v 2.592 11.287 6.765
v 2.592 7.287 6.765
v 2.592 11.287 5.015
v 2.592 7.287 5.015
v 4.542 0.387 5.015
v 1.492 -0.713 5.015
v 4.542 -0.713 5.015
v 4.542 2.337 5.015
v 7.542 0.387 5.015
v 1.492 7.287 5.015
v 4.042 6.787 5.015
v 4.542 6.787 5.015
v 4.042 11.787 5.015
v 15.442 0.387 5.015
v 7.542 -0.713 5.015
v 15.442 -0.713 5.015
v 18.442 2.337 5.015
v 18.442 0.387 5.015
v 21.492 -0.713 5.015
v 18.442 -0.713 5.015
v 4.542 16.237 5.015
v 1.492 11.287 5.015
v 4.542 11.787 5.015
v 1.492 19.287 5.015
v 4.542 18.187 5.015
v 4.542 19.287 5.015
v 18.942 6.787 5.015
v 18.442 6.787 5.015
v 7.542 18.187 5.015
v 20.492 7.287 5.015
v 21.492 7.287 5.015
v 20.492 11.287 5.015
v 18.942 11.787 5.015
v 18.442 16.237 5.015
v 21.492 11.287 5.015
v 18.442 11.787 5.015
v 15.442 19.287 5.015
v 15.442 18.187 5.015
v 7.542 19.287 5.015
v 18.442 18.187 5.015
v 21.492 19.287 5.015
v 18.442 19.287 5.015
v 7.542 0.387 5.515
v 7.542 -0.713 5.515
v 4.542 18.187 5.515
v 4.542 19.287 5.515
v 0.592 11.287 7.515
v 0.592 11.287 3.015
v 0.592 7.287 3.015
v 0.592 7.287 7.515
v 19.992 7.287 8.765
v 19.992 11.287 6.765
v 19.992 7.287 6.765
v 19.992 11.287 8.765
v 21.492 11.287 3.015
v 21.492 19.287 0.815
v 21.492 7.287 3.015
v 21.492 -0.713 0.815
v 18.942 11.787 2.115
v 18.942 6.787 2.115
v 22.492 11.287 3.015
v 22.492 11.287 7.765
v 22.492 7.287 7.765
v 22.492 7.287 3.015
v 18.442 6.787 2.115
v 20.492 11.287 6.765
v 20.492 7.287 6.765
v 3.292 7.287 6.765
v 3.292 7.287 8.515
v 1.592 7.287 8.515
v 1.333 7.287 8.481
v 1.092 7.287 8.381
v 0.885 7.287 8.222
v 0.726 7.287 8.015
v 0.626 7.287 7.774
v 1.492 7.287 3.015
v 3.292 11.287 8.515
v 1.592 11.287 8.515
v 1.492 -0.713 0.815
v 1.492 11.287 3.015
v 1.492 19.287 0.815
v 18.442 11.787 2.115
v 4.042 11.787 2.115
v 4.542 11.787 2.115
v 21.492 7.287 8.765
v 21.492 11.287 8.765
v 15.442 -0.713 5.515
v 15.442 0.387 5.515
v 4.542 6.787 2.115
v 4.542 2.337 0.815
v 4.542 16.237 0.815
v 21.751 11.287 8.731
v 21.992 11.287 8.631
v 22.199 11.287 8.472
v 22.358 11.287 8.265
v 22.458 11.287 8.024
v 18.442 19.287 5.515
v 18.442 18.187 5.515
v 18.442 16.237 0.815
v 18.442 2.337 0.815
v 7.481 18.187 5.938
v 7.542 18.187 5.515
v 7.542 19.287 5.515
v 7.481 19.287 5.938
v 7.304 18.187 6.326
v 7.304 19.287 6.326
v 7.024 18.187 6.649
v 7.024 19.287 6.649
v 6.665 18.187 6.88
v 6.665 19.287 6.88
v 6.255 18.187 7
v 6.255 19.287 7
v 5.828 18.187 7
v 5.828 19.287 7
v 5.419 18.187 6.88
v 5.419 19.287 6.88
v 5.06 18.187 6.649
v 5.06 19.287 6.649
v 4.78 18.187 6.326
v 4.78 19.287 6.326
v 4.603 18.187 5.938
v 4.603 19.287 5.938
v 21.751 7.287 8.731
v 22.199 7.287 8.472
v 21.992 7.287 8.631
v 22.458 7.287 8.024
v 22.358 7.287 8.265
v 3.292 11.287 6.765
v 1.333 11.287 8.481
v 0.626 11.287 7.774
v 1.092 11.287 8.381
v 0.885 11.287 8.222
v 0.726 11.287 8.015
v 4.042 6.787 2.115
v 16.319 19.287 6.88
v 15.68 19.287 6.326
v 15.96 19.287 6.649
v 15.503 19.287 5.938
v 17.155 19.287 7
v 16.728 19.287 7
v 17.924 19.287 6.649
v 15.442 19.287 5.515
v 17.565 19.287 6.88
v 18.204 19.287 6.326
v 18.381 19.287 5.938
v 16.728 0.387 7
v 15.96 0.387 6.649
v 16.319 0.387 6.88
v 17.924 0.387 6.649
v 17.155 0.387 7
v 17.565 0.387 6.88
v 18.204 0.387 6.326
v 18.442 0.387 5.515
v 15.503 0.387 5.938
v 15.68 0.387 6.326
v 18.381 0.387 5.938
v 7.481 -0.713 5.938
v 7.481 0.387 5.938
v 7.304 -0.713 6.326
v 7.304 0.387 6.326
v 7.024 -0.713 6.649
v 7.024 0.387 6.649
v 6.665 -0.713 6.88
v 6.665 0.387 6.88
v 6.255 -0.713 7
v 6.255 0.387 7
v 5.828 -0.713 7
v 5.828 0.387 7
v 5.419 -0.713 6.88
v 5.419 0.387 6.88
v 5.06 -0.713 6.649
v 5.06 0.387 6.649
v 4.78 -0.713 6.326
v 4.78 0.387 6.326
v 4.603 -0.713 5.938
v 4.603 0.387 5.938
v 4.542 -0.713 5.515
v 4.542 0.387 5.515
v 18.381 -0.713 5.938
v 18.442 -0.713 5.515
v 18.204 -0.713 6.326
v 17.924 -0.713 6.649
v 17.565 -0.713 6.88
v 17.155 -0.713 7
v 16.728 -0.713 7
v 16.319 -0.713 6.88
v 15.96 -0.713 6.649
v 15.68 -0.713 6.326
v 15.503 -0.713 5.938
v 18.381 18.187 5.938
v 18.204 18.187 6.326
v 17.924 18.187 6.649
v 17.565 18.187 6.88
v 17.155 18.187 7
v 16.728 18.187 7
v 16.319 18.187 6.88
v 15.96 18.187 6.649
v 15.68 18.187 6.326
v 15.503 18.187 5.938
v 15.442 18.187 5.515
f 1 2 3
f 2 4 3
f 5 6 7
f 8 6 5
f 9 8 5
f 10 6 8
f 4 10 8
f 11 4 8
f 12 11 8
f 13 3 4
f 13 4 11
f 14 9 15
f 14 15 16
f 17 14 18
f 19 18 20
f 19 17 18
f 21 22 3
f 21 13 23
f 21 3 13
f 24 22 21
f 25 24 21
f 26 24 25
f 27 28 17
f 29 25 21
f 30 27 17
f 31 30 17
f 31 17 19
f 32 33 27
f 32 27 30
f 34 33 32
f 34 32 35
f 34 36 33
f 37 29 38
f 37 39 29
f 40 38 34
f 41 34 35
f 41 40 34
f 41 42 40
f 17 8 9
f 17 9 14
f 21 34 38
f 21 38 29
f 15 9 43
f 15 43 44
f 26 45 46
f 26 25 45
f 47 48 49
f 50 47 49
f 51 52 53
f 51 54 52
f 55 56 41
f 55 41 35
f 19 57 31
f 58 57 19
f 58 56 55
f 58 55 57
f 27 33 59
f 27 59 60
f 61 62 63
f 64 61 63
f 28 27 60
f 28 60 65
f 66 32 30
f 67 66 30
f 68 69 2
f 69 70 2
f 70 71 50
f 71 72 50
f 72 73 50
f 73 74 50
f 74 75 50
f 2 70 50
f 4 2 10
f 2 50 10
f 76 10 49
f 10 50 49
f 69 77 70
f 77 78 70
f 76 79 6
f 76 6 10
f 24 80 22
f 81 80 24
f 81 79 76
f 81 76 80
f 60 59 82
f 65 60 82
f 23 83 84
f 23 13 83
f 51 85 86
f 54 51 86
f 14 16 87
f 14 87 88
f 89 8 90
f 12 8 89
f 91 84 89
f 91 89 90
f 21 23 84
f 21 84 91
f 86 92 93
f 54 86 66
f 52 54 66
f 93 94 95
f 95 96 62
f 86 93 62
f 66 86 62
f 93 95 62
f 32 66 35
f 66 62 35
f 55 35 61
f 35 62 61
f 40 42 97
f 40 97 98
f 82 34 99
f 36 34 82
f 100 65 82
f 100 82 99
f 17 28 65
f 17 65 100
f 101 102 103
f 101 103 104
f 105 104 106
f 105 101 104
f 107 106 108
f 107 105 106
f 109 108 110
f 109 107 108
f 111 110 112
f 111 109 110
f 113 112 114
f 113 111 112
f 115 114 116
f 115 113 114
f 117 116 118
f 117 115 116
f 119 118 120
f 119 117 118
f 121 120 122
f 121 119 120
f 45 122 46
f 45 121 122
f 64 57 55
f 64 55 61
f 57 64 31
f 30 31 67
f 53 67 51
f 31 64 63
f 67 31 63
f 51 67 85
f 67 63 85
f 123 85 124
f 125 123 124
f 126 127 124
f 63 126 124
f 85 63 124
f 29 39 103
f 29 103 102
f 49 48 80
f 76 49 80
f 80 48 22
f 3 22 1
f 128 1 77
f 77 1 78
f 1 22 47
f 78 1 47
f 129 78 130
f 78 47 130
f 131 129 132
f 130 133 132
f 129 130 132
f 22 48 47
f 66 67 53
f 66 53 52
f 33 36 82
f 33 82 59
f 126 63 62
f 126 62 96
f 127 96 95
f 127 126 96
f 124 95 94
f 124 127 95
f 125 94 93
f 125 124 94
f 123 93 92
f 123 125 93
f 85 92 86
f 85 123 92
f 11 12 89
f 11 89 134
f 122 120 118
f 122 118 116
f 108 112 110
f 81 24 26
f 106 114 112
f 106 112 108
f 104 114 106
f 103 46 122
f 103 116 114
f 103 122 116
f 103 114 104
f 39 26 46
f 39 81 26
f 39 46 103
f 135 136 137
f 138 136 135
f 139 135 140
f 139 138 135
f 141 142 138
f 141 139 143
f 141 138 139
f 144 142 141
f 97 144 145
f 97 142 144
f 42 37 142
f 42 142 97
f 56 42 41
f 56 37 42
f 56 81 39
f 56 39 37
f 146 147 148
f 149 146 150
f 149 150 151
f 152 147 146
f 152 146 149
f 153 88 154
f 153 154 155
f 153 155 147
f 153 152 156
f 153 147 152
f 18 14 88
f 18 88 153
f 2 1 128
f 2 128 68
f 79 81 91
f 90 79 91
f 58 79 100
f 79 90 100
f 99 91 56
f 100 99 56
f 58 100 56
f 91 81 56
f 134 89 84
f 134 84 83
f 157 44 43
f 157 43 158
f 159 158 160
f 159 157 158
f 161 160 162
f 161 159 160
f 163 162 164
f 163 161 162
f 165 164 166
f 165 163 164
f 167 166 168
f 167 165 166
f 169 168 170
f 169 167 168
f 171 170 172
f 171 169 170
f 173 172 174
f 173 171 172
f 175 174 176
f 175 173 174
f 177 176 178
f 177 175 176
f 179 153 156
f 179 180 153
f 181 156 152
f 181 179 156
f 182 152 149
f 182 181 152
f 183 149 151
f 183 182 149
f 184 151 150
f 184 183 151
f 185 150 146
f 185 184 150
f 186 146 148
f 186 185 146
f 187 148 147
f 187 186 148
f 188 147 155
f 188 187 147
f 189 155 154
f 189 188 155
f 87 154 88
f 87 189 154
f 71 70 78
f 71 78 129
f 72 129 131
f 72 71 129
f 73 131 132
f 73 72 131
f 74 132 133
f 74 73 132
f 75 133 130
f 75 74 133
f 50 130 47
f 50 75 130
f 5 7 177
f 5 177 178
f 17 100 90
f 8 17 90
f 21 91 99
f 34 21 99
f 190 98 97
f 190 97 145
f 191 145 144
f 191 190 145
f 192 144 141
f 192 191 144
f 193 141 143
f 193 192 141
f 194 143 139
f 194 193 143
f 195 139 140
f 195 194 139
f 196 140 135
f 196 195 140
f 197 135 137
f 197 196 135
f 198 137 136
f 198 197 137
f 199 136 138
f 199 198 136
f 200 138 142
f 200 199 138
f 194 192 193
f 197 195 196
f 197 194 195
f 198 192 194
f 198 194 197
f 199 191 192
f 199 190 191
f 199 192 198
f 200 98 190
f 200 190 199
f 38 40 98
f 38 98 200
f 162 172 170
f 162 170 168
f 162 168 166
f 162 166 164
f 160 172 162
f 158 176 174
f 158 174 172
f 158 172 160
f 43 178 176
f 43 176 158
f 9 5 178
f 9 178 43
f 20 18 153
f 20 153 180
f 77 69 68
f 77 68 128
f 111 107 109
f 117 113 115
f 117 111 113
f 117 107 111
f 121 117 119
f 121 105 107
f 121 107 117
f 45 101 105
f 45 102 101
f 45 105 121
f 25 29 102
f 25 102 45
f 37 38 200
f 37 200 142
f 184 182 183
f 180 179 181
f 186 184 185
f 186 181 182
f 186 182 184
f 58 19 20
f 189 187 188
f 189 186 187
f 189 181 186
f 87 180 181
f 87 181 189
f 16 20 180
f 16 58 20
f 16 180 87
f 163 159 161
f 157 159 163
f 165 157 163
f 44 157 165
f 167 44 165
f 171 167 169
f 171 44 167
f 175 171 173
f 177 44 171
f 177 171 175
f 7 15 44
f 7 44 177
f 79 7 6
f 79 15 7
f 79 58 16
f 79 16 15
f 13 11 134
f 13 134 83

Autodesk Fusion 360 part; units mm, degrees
sketch "Sketch1" plane through (0, 0, 0) normal (0, 0, 1) x (1, 0, 0) in component "main-switchbody"
  line L0 (0, 0) -> (0, 20) construction
  line L1 (0, 20) -> (20, 20) construction
  line L2 (20, 20) -> (20, 0) construction
  line L3 (20, 0) -> (0, 0) construction
  line L4 (0, 0) -> (20, 20) construction
  line L5 (20, 0) -> (0, 20) construction
  line L6 (10, 0) -> (18.9, 0) construction
  line L7 (10, 10) -> (18.9, 10) construction
  line L8 (18.9, 10) -> (18.9, 18.9) construction
  line L9 (18.9, 18.9) -> (1.1, 18.9) construction
  line L10 (1.1, 18.9) -> (1.1, 1.1) construction
  line L11 (1.1, 1.1) -> (18.9, 1.1) construction
  line L12 (18.9, 1.1) -> (18.9, 18.9) construction
  line L13 (10, 10) -> (3.05, 10) construction
  line L14 (3.05, 10) -> (3.05, 16.95) construction
  line L15 (3.05, 16.95) -> (16.95, 16.95) construction
  line L16 (16.95, 16.95) -> (16.95, 3.05) construction
  line L17 (16.95, 3.05) -> (3.05, 3.05) construction
  line L18 (3.05, 3.05) -> (3.05, 16.95) construction
  line L19 (3.05, 3.05) -> (0, 3.05) construction
  line L20 (3.05, 3.05) -> (3.05, 0) construction
  line L21 (16.95, 3.05) -> (20, 3.05) construction
  line L22 (16.95, 16.95) -> (20, 16.95) construction
  line L23 (16.95, 16.95) -> (16.95, 20) construction
  line L24 (3.05, 16.95) -> (3.05, 20) construction
  line L25 (3.05, 16.95) -> (0, 16.95) construction
  line L26 (3.05, 18.9) -> (6.05, 18.9) construction
  line L27 (6.05, 18.9) -> (6.05, 20) construction
  line L28 (16.95, 18.9) -> (13.95, 18.9) construction
  line L29 (13.95, 18.9) -> (13.95, 20) construction
  line L30 (16.95, 3.05) -> (16.95, 0) construction
  line L31 (16.95, 1.1) -> (13.95, 1.1) construction
  line L32 (13.95, 1.1) -> (13.95, 0) construction
  line L33 (3.05, 1.1) -> (6.05, 1.1) construction
  line L34 (6.05, 1.1) -> (6.05, 0) construction
  line L35 (0, 20) -> (20, 20) construction
  line L36 (20, 20) -> (20, 0) construction
  line L37 (20, 0) -> (0, 0) construction
  line L38 (0, 0) -> (0, 20) construction
  line L39 (0, 20) -> (20, 20)
  line L40 (20, 20) -> (20, 0)
  line L41 (20, 0) -> (0, 0)
  line L42 (0, 0) -> (0, 20)
  line L43 (16.95, 3.05) -> (3.05, 3.05)
  line L44 (3.05, 3.05) -> (3.05, 16.95)
  line L45 (3.05, 16.95) -> (16.95, 16.95)
  line L46 (16.95, 16.95) -> (16.95, 3.05)
  line L47 (3.05, 1.1) -> (6.05, 1.1)
  line L48 (6.05, 1.1) -> (6.05, 0)
  line L49 (6.05, 0) -> (3.05, 0)
  line L50 (3.05, 0) -> (3.05, 1.1)
  line L51 (13.95, 1.1) -> (16.95, 1.1)
  line L52 (16.95, 1.1) -> (16.95, 0)
  line L53 (16.95, 0) -> (13.95, 0)
  line L54 (13.95, 0) -> (13.95, 1.1)
  line L55 (13.95, 20) -> (16.95, 20)
  line L56 (16.95, 20) -> (16.95, 18.9)
  line L57 (16.95, 18.9) -> (13.95, 18.9)
  line L58 (13.95, 18.9) -> (13.95, 20)
  line L59 (3.05, 20) -> (6.05, 20)
  line L60 (6.05, 20) -> (6.05, 18.9)
  line L61 (6.05, 18.9) -> (3.05, 18.9)
  line L62 (3.05, 18.9) -> (3.05, 20)
  line L63 (1.1, 10) -> (1.1, 12)
  line L64 (1.1, 10) -> (1.1, 8)
  line L65 (1.1, 8) -> (-1.9, 8)
  line L66 (-1.9, 8) -> (1.1, 8)
  line L67 (1.1, 8) -> (1.1, 12)
  line L68 (1.1, 12) -> (-1.9, 12)
  line L69 (-1.9, 12) -> (-1.9, 8)
  line L70 (3.05, 10) -> (3.05, 7.5) construction
  line L71 (3.05, 7.5) -> (2.55, 7.5) construction
  line L72 (2.55, 7.5) -> (2.55, 12.5) construction
  line L73 (2.55, 12.5) -> (3.05, 12.5085) construction
  line L74 (3.05, 12.5085) -> (3.05, 7.5) construction
  line L75 (2.55, 12.5) -> (16.95, 12.5) construction
  line L76 (16.95, 12.5) -> (17.45, 12.5) construction
  line L77 (17.45, 12.5) -> (17.45, 7.5) construction
  line L78 (17.45, 7.5) -> (16.95, 7.5) construction
  line L79 (16.95, 7.5) -> (16.95, 12.5) construction
  line L80 (17.45, 7.5) -> (16.95, 7.5)
  line L81 (16.95, 7.5) -> (16.95, 12.5)
  line L82 (16.95, 12.5) -> (17.45, 12.5)
  line L83 (17.45, 12.5) -> (17.45, 7.5)
  line L84 (3.05, 7.5) -> (2.55, 7.5)
  line L85 (2.55, 7.5) -> (2.55, 12.5)
  line L86 (2.55, 12.5) -> (3.05, 12.5)
  line L87 (3.05, 12.5) -> (3.05, 7.5)
  dimension "d1" = 20
  dimension "d2" = 20
  dimension "d3" = 8.9
  dimension "d4" = 8.9
  dimension "d5" = 8.9
  dimension "d6" = 17.8
  dimension "d7" = 17.8
  dimension "d8" = 6.95
  dimension "d9" = 6.95
  dimension "d10" = 13.9
  dimension "d11" = 13.9
  dimension "d12" = 13.9
  dimension "d13" = 3
  dimension "d14" = 3
  dimension "d15" = 3
  dimension "d16" = 3
  dimension "d21" = 3
  dimension "d58" = 2.5
  dimension "d59" = 0.5
  dimension "d60" = 5
  dimension "d61" = 0.5
  dimension "d62" = 5
extrude "Extrude3" add sketch "Sketch1" along normal blind 7.5 contours L42 L63 L64 L65 L66 L67 L68 | L42 L65 L66 L68 L69 makes body 1 in component "main-switchbody"
extrude "Extrude2" add sketch "Sketch1" along normal blind 4 separate body contours L39 L40 L41 L42 L47 L48 L50 L51 L52 L54 L56 L57 L58 L60 L61 L62 L63 L64 L65 L66 L67 L68 | L42 L63 L64 L65 L66 L67 L68 | L46 L80 L81 L82 L83 | L44 L84 L85 L86 L87 makes body 2 in component "main-switchbody"
extrude "Extrude1" add sketch "Sketch1" along normal blind 6 separate body contours L39 L59 L60 L61 L62 | L39 L55 L56 L57 L58 | L41 L47 L48 L49 L50 | L41 L51 L52 L53 L54 makes body 3 at (4.05, 1.1, 2) makes body 4 at (5.05, 20, 4) makes body 5 at (14.95, 1.1, 2) makes body 6 at (14.95, 20, 2) in component "main-switchbody"
extrude "Extrude4" cut sketch "Sketch1" along normal blind 2 contours L42 L65 L66 L68 L69 bodies 1 in component "main-switchbody"
sketch "Sketch2" plane through (1.1, 0, 0) normal (1, 0, 0) x (0, 1, 0) in component "main-switchbody"
  line L0 (8, 0) -> (12, 0)
  line L1 (12, 0) -> (12, 7.5)
  line L2 (12, 7.5) -> (8, 7.5)
  line L3 (8, 7.5) -> (8, 0)
  line L4 (8, 7.5) -> (8, 4) construction
  line L5 (8, 4) -> (12, 4) construction
  line L6 (12, 4) -> (12, 7.5) construction
  line L7 (12, 7.5) -> (8, 7.5) construction
  line L8 (8, 7.5) -> (8, 5.75) construction
  line L9 (8, 5.75) -> (12, 5.75) construction
  line L10 (8, 7.5) -> (12, 7.5)
  line L11 (12, 7.5) -> (12, 5.75)
  line L12 (12, 5.75) -> (8, 5.75)
  line L13 (8, 5.75) -> (8, 7.5)
  dimension "d26" = 1.75
extrude "Extrude5" add sketch "Sketch2" along normal blind 1 contours L1 L2 L3 L10 L11 L12 L13 bodies 1 in component "main-switchbody"
extrude "Extrude6" cut 1 faces at (-1.9, 10.6667, 3.8333) along direction (1, 0, 0) blind 1 on bodies 1 bodies 1 in component "main-switchbody"
sketch "Sketch3" plane through (0, 18.9, 0) normal (0, -1, 0) x (1, 0, 0) in component "main-switchbody"
  line L0 (3.05, 0) -> (6.05, 0)
  line L1 (6.05, 0) -> (6.05, 6)
  line L2 (6.05, 6) -> (3.05, 6)
  line L3 (3.05, 6) -> (3.05, 0)
  line L4 (3.05, 6) -> (3.05, 4) construction
  line L5 (6.05, 4) -> (6.05, 6) construction
  line L6 (3.05, 6) -> (3.05, 4.5) construction
  line L7 (6.05, 6) -> (6.05, 4.5) construction
  arc A0 (6.05, 4.5) -> (3.05, 4.5) centre (4.55, 4.5) ccw construction
  arc A1 (6.05, 4.5) -> (3.05, 4.5) centre (4.55, 4.5) ccw
  dimension "d31" = 1.5
  dimension "d32" = 1.5
extrude "Extrude7" cut sketch "Sketch3" against normal blind 1.1 contours L2 L3 A1 | L1 L2 A1 bodies 4 in component "main-switchbody"
sketch "Sketch4" plane through (0, 0, 0) normal (0, -1, 0) x (1, 0, 0) in component "main-switchbody"
  line L0 (3.05, 0) -> (6.05, 0)
  line L1 (6.05, 0) -> (6.05, 6)
  line L2 (6.05, 6) -> (3.05, 6)
  line L3 (3.05, 6) -> (3.05, 0)
  line L4 (3.05, 6) -> (3.05, 4.5) construction
  line L5 (6.05, 6) -> (6.05, 4.5) construction
  arc A0 (6.05, 4.5) -> (3.05, 4.5) centre (4.55, 4.5) ccw
extrude "Extrude8" cut sketch "Sketch4" against normal blind 1.1 contours L2 L3 A0 | L1 L2 A0 bodies 3 in component "main-switchbody"
sketch "Sketch5" plane through (0, 0, 0) normal (0, -1, 0) x (1, 0, 0) in component "main-switchbody"
  line L0 (13.95, 0) -> (16.95, 0)
  line L1 (16.95, 0) -> (16.95, 6)
  line L2 (16.95, 6) -> (13.95, 6)
  line L3 (13.95, 6) -> (13.95, 0)
  line L4 (13.95, 6) -> (13.95, 4.5) construction
  line L5 (16.95, 6) -> (16.95, 4.5) construction
  arc A0 (16.95, 4.5) -> (13.95, 4.5) centre (15.45, 4.5) ccw
extrude "Extrude9" cut sketch "Sketch5" against normal blind 1.1 contours L2 L3 A0 | L1 L2 A0 bodies 5 in component "main-switchbody"
sketch "Sketch6" plane through (0, 18.9, 0) normal (0, -1, 0) x (1, 0, 0) in component "main-switchbody"
  line L0 (13.95, 0) -> (16.95, 0)
  line L1 (16.95, 0) -> (16.95, 6)
  line L2 (16.95, 6) -> (13.95, 6)
  line L3 (13.95, 6) -> (13.95, 0)
  line L4 (13.95, 6) -> (13.95, 4.5) construction
  line L5 (16.95, 6) -> (16.95, 4.5) construction
  arc A0 (16.95, 4.5) -> (13.95, 4.5) centre (15.45, 4.5) ccw
extrude "Extrude10" cut sketch "Sketch6" against normal blind 1.1 contours L2 L3 A0 | L1 L2 A0 bodies 6 in component "main-switchbody"
sketch "Sketch7" plane through (0, 0, 4) normal (0, 0, 1) x (-1, 0, 0) in component "main-switchbody"
  line L0 (-3.05, -16.95) -> (-16.95, -16.95)
  line L1 (-16.95, -16.95) -> (-16.95, -3.05)
  line L2 (-16.95, -3.05) -> (-3.05, -3.05)
  line L3 (-3.05, -3.05) -> (-3.05, -16.95)
  line L4 (-6.05, -20) -> (-6.05, -18.9)
  line L5 (-6.05, -18.9) -> (-3.05, -18.9)
  line L6 (-3.05, -18.9) -> (-3.05, -20)
  line L7 (-3.05, -20) -> (0, -20)
  line L8 (0, -20) -> (0, 0)
  line L9 (0, 0) -> (-3.05, 0)
  line L10 (-3.05, 0) -> (-3.05, -1.1)
  line L11 (-3.05, -1.1) -> (-6.05, -1.1)
  line L12 (-6.05, -1.1) -> (-6.05, 0)
  line L13 (-6.05, 0) -> (-13.95, 0)
  line L14 (-13.95, 0) -> (-13.95, -1.1)
  line L15 (-13.95, -1.1) -> (-16.95, -1.1)
  line L16 (-16.95, -1.1) -> (-16.95, 0)
  line L17 (-16.95, 0) -> (-20, 0)
  line L18 (-20, 0) -> (-20, -20)
  line L19 (-20, -20) -> (-16.95, -20)
  line L20 (-16.95, -20) -> (-16.95, -18.9)
  line L21 (-16.95, -18.9) -> (-13.95, -18.9)
  line L22 (-13.95, -18.9) -> (-13.95, -20)
  line L23 (-13.95, -20) -> (-6.05, -20)
  line L24 (-20, -10) -> (-20, -11.5) construction
  line L25 (-20, -10) -> (-20, -8.5) construction
  line L26 (-20, -8.5) -> (-19, -8.5) construction
  line L27 (-19, -8.5) -> (-19, -11.5) construction
  line L28 (-19, -11.5) -> (-20, -11.5) construction
  line L29 (-20, -11.5) -> (-21, -11.5) construction
  line L30 (-21, -11.5) -> (-21, -8.5) construction
  line L31 (-21, -8.5) -> (-20, -8.5) construction
  line L32 (-19, -11.5) -> (-21, -11.5)
  line L33 (-21, -11.5) -> (-21, -8.5)
  line L34 (-21, -8.5) -> (-19, -8.5)
  line L35 (-19, -8.5) -> (-19, -11.5)
  dimension "d41" = 1.5
  dimension "d42" = 1
extrude "Extrude11" add sketch "Sketch7" along normal blind 3 contours L18 L32 L33 L34 | L18 L32 L34 L35 bodies 2 in component "main-switchbody"
extrude "Extrude12" add 1 faces at (20, 8.5, 6) along direction (0, -1, 0) blind 0.5 on bodies 2 bodies 2 in component "main-switchbody"
extrude "Extrude13" add 1 faces at (20, 11.5, 6) along direction (0, 1, 0) blind 0.5 on bodies 2 bodies 2 in component "main-switchbody"
extrude "Extrude14" add 1 faces at (19.6667, 9.3333, 7) along direction (0, 0, 1) blind 0.75 on bodies 2 bodies 2 in component "main-switchbody"
sketch "Sketch8" plane through (0, 0, 4) normal (0, 0, -1) x (1, 0, 0) in component "main-switchbody"
  line L0 (20, -8) -> (20, -12)
  line L1 (20, -12) -> (21, -12)
  line L2 (21, -12) -> (21, -8)
  line L3 (21, -8) -> (20, -8)
  line L4 (20, -12) -> (20, -8)
extrude "Extrude15" add sketch "Sketch8" along normal blind 2 bodies 2 in component "main-switchbody"
sketch "Sketch9" plane through (19, 0, 0) normal (-1, 0, 0) x (0, -1, 0) in component "main-switchbody"
  line L0 (-12, 4) -> (-8, 4)
  line L1 (-8, 4) -> (-8, 7.75)
  line L2 (-8, 7.75) -> (-12, 7.75)
  line L3 (-12, 7.75) -> (-12, 4)
  line L4 (-12, 7.75) -> (-12, 5.75) construction
  line L5 (-12, 5.75) -> (-8, 5.75) construction
  line L6 (-12, 7.75) -> (-8, 7.75)
  line L7 (-8, 7.75) -> (-8, 5.75)
  line L8 (-8, 5.75) -> (-12, 5.75)
  line L9 (-12, 5.75) -> (-12, 7.75)
  dimension "d53" = 2
extrude "Extrude16" add sketch "Sketch9" along normal blind 0.5 contours L1 L2 L3 L6 L7 L8 L9 bodies 2 in component "main-switchbody"
extrude "Extrude17" cut 1 faces at (2.1, 9.3333, 6.9167) along direction (-1, 0, 0) blind 0.3 on bodies 1 bodies 1 in component "main-switchbody"
extrude "Extrude18" cut sketch "Sketch1" along normal blind 2.7 contours L44 L84 L85 L86 L87 bodies 2 in component "main-switchbody"
extrude "Extrude19" cut sketch "Sketch1" along normal blind 2.7 contours L46 L80 L81 L82 L83 bodies 2 in component "main-switchbody"
extrude "Extrude20" add sketch "Sketch1" against normal blind 0.2 contours L39 L40 L41 L42 L47 L48 L50 L51 L52 L54 L56 L57 L58 L60 L61 L62 L63 L64 L65 L66 L67 L68 | L39 L59 L60 L61 L62 | L42 L63 L64 L65 L66 L67 L68 | L39 L55 L56 L57 L58 | L41 L47 L48 L49 L50 | L41 L51 L52 L53 L54 bodies 1 2 3 4 5 6 in component "main-switchbody"
fillet "Fillet1" radius 1 2 edges at (21, 10, 7.75) (-0.9, 10, 7.5) on bodies 1 in component "main-switchbody"
extrude "Extrude21" add 1 faces at (2.8833, 9.1667, 2.7) along direction (0, 0, -1) blind 2.9 on bodies 1 bodies 1 in component "main-switchbody"
extrude "Extrude22" add 1 faces at (17.1167, 10.8333, 2.7) along direction (0, 0, -1) blind 2.9 on bodies 1 bodies 1 in component "main-switchbody"
sketch "Sketch10" plane through (0, 0, 4) normal (0, 0, 1) x (-1, 0, 0) in component "main-switchbody"
  line L0 (-3.05, -16.95) -> (-16.95, -16.95)
  line L1 (-16.95, -16.95) -> (-16.95, -3.05)
  line L2 (-16.95, -3.05) -> (-3.05, -3.05)
  line L3 (-3.05, -3.05) -> (-3.05, -16.95)
  line L4 (0, -12) -> (-1.1, -12)
  line L5 (-1.1, -12) -> (-1.1, -8)
  line L6 (-1.1, -8) -> (0, -8)
  line L7 (0, -8) -> (0, 0)
  line L8 (0, 0) -> (-3.05, 0)
  line L9 (-3.05, 0) -> (-3.05, -1.1)
  line L10 (-3.05, -1.1) -> (-6.05, -1.1)
  line L11 (-6.05, -1.1) -> (-6.05, 0)
  line L12 (-6.05, 0) -> (-13.95, 0)
  line L13 (-13.95, 0) -> (-13.95, -1.1)
  line L14 (-13.95, -1.1) -> (-16.95, -1.1)
  line L15 (-16.95, -1.1) -> (-16.95, 0)
  line L16 (-16.95, 0) -> (-20, 0)
  line L17 (-20, 0) -> (-20, -8)
  line L18 (-20, -8) -> (-19, -8)
  line L19 (-19, -8) -> (-19, -12)
  line L20 (-19, -12) -> (-20, -12)
  line L21 (-20, -12) -> (-20, -20)
  line L22 (-20, -20) -> (-16.95, -20)
  line L23 (-16.95, -20) -> (-16.95, -18.9)
  line L24 (-16.95, -18.9) -> (-13.95, -18.9)
  line L25 (-13.95, -18.9) -> (-13.95, -20)
  line L26 (-13.95, -20) -> (-6.05, -20)
  line L27 (-6.05, -20) -> (-6.05, -18.9)
  line L28 (-6.05, -18.9) -> (-3.05, -18.9)
  line L29 (-3.05, -18.9) -> (-3.05, -20)
  line L30 (-3.05, -20) -> (0, -20)
  line L31 (0, -20) -> (0, -12)
  line L32 (-3.05, -10) -> (-3.05, -12.5) construction
  line L33 (-3.05, -12.5) -> (-3.05, -7.5) construction
  line L34 (-3.05, -7.5) -> (-2.55, -7.5) construction
  line L35 (-2.55, -7.5) -> (-3.05, -7.5) construction
  line L36 (-3.05, -7.5) -> (-3.05, -12.5) construction
  line L37 (-3.05, -12.5) -> (-2.55, -12.5) construction
  line L38 (-2.55, -12.5) -> (-2.55, -7.5) construction
  line L39 (-3.05, -12.5) -> (-16.95, -12.5) construction
  line L40 (-16.95, -12.5) -> (-16.95, -7.5) construction
  line L41 (-16.95, -7.5) -> (-17.45, -7.5) construction
  line L42 (-17.45, -7.5) -> (-16.95, -7.5) construction
  line L43 (-16.95, -7.5) -> (-16.95, -12.5) construction
  line L44 (-16.95, -12.5) -> (-17.45, -12.5) construction
  line L45 (-17.45, -12.5) -> (-17.45, -7.5) construction
  line L46 (-16.95, -12.5) -> (-17.45, -12.5)
  line L47 (-17.45, -12.5) -> (-17.45, -7.5)
  line L48 (-17.45, -7.5) -> (-16.95, -7.5)
  line L49 (-16.95, -7.5) -> (-16.95, -12.5)
  line L50 (-2.55, -12.5) -> (-3.05, -12.5)
  line L51 (-3.05, -12.5) -> (-3.05, -7.5)
  line L52 (-3.05, -7.5) -> (-2.55, -7.5)
  line L53 (-2.55, -7.5) -> (-2.55, -12.5)
  dimension "d75" = 5
  dimension "d76" = 0.5
  dimension "d77" = 0.5
extrude "Extrude23" cut sketch "Sketch10" against normal blind 2.9 contours L3 L50 L51 L52 L53 | L1 L46 L47 L48 L49 bodies 1 in component "main-switchbody"
component "main-switchbody" placed x (1, 0, 0) y (0, 1, 0) z (0, 0, 1) at (1.4919, -0.7126, 1.0152)
properties part number "mxledbit container"
